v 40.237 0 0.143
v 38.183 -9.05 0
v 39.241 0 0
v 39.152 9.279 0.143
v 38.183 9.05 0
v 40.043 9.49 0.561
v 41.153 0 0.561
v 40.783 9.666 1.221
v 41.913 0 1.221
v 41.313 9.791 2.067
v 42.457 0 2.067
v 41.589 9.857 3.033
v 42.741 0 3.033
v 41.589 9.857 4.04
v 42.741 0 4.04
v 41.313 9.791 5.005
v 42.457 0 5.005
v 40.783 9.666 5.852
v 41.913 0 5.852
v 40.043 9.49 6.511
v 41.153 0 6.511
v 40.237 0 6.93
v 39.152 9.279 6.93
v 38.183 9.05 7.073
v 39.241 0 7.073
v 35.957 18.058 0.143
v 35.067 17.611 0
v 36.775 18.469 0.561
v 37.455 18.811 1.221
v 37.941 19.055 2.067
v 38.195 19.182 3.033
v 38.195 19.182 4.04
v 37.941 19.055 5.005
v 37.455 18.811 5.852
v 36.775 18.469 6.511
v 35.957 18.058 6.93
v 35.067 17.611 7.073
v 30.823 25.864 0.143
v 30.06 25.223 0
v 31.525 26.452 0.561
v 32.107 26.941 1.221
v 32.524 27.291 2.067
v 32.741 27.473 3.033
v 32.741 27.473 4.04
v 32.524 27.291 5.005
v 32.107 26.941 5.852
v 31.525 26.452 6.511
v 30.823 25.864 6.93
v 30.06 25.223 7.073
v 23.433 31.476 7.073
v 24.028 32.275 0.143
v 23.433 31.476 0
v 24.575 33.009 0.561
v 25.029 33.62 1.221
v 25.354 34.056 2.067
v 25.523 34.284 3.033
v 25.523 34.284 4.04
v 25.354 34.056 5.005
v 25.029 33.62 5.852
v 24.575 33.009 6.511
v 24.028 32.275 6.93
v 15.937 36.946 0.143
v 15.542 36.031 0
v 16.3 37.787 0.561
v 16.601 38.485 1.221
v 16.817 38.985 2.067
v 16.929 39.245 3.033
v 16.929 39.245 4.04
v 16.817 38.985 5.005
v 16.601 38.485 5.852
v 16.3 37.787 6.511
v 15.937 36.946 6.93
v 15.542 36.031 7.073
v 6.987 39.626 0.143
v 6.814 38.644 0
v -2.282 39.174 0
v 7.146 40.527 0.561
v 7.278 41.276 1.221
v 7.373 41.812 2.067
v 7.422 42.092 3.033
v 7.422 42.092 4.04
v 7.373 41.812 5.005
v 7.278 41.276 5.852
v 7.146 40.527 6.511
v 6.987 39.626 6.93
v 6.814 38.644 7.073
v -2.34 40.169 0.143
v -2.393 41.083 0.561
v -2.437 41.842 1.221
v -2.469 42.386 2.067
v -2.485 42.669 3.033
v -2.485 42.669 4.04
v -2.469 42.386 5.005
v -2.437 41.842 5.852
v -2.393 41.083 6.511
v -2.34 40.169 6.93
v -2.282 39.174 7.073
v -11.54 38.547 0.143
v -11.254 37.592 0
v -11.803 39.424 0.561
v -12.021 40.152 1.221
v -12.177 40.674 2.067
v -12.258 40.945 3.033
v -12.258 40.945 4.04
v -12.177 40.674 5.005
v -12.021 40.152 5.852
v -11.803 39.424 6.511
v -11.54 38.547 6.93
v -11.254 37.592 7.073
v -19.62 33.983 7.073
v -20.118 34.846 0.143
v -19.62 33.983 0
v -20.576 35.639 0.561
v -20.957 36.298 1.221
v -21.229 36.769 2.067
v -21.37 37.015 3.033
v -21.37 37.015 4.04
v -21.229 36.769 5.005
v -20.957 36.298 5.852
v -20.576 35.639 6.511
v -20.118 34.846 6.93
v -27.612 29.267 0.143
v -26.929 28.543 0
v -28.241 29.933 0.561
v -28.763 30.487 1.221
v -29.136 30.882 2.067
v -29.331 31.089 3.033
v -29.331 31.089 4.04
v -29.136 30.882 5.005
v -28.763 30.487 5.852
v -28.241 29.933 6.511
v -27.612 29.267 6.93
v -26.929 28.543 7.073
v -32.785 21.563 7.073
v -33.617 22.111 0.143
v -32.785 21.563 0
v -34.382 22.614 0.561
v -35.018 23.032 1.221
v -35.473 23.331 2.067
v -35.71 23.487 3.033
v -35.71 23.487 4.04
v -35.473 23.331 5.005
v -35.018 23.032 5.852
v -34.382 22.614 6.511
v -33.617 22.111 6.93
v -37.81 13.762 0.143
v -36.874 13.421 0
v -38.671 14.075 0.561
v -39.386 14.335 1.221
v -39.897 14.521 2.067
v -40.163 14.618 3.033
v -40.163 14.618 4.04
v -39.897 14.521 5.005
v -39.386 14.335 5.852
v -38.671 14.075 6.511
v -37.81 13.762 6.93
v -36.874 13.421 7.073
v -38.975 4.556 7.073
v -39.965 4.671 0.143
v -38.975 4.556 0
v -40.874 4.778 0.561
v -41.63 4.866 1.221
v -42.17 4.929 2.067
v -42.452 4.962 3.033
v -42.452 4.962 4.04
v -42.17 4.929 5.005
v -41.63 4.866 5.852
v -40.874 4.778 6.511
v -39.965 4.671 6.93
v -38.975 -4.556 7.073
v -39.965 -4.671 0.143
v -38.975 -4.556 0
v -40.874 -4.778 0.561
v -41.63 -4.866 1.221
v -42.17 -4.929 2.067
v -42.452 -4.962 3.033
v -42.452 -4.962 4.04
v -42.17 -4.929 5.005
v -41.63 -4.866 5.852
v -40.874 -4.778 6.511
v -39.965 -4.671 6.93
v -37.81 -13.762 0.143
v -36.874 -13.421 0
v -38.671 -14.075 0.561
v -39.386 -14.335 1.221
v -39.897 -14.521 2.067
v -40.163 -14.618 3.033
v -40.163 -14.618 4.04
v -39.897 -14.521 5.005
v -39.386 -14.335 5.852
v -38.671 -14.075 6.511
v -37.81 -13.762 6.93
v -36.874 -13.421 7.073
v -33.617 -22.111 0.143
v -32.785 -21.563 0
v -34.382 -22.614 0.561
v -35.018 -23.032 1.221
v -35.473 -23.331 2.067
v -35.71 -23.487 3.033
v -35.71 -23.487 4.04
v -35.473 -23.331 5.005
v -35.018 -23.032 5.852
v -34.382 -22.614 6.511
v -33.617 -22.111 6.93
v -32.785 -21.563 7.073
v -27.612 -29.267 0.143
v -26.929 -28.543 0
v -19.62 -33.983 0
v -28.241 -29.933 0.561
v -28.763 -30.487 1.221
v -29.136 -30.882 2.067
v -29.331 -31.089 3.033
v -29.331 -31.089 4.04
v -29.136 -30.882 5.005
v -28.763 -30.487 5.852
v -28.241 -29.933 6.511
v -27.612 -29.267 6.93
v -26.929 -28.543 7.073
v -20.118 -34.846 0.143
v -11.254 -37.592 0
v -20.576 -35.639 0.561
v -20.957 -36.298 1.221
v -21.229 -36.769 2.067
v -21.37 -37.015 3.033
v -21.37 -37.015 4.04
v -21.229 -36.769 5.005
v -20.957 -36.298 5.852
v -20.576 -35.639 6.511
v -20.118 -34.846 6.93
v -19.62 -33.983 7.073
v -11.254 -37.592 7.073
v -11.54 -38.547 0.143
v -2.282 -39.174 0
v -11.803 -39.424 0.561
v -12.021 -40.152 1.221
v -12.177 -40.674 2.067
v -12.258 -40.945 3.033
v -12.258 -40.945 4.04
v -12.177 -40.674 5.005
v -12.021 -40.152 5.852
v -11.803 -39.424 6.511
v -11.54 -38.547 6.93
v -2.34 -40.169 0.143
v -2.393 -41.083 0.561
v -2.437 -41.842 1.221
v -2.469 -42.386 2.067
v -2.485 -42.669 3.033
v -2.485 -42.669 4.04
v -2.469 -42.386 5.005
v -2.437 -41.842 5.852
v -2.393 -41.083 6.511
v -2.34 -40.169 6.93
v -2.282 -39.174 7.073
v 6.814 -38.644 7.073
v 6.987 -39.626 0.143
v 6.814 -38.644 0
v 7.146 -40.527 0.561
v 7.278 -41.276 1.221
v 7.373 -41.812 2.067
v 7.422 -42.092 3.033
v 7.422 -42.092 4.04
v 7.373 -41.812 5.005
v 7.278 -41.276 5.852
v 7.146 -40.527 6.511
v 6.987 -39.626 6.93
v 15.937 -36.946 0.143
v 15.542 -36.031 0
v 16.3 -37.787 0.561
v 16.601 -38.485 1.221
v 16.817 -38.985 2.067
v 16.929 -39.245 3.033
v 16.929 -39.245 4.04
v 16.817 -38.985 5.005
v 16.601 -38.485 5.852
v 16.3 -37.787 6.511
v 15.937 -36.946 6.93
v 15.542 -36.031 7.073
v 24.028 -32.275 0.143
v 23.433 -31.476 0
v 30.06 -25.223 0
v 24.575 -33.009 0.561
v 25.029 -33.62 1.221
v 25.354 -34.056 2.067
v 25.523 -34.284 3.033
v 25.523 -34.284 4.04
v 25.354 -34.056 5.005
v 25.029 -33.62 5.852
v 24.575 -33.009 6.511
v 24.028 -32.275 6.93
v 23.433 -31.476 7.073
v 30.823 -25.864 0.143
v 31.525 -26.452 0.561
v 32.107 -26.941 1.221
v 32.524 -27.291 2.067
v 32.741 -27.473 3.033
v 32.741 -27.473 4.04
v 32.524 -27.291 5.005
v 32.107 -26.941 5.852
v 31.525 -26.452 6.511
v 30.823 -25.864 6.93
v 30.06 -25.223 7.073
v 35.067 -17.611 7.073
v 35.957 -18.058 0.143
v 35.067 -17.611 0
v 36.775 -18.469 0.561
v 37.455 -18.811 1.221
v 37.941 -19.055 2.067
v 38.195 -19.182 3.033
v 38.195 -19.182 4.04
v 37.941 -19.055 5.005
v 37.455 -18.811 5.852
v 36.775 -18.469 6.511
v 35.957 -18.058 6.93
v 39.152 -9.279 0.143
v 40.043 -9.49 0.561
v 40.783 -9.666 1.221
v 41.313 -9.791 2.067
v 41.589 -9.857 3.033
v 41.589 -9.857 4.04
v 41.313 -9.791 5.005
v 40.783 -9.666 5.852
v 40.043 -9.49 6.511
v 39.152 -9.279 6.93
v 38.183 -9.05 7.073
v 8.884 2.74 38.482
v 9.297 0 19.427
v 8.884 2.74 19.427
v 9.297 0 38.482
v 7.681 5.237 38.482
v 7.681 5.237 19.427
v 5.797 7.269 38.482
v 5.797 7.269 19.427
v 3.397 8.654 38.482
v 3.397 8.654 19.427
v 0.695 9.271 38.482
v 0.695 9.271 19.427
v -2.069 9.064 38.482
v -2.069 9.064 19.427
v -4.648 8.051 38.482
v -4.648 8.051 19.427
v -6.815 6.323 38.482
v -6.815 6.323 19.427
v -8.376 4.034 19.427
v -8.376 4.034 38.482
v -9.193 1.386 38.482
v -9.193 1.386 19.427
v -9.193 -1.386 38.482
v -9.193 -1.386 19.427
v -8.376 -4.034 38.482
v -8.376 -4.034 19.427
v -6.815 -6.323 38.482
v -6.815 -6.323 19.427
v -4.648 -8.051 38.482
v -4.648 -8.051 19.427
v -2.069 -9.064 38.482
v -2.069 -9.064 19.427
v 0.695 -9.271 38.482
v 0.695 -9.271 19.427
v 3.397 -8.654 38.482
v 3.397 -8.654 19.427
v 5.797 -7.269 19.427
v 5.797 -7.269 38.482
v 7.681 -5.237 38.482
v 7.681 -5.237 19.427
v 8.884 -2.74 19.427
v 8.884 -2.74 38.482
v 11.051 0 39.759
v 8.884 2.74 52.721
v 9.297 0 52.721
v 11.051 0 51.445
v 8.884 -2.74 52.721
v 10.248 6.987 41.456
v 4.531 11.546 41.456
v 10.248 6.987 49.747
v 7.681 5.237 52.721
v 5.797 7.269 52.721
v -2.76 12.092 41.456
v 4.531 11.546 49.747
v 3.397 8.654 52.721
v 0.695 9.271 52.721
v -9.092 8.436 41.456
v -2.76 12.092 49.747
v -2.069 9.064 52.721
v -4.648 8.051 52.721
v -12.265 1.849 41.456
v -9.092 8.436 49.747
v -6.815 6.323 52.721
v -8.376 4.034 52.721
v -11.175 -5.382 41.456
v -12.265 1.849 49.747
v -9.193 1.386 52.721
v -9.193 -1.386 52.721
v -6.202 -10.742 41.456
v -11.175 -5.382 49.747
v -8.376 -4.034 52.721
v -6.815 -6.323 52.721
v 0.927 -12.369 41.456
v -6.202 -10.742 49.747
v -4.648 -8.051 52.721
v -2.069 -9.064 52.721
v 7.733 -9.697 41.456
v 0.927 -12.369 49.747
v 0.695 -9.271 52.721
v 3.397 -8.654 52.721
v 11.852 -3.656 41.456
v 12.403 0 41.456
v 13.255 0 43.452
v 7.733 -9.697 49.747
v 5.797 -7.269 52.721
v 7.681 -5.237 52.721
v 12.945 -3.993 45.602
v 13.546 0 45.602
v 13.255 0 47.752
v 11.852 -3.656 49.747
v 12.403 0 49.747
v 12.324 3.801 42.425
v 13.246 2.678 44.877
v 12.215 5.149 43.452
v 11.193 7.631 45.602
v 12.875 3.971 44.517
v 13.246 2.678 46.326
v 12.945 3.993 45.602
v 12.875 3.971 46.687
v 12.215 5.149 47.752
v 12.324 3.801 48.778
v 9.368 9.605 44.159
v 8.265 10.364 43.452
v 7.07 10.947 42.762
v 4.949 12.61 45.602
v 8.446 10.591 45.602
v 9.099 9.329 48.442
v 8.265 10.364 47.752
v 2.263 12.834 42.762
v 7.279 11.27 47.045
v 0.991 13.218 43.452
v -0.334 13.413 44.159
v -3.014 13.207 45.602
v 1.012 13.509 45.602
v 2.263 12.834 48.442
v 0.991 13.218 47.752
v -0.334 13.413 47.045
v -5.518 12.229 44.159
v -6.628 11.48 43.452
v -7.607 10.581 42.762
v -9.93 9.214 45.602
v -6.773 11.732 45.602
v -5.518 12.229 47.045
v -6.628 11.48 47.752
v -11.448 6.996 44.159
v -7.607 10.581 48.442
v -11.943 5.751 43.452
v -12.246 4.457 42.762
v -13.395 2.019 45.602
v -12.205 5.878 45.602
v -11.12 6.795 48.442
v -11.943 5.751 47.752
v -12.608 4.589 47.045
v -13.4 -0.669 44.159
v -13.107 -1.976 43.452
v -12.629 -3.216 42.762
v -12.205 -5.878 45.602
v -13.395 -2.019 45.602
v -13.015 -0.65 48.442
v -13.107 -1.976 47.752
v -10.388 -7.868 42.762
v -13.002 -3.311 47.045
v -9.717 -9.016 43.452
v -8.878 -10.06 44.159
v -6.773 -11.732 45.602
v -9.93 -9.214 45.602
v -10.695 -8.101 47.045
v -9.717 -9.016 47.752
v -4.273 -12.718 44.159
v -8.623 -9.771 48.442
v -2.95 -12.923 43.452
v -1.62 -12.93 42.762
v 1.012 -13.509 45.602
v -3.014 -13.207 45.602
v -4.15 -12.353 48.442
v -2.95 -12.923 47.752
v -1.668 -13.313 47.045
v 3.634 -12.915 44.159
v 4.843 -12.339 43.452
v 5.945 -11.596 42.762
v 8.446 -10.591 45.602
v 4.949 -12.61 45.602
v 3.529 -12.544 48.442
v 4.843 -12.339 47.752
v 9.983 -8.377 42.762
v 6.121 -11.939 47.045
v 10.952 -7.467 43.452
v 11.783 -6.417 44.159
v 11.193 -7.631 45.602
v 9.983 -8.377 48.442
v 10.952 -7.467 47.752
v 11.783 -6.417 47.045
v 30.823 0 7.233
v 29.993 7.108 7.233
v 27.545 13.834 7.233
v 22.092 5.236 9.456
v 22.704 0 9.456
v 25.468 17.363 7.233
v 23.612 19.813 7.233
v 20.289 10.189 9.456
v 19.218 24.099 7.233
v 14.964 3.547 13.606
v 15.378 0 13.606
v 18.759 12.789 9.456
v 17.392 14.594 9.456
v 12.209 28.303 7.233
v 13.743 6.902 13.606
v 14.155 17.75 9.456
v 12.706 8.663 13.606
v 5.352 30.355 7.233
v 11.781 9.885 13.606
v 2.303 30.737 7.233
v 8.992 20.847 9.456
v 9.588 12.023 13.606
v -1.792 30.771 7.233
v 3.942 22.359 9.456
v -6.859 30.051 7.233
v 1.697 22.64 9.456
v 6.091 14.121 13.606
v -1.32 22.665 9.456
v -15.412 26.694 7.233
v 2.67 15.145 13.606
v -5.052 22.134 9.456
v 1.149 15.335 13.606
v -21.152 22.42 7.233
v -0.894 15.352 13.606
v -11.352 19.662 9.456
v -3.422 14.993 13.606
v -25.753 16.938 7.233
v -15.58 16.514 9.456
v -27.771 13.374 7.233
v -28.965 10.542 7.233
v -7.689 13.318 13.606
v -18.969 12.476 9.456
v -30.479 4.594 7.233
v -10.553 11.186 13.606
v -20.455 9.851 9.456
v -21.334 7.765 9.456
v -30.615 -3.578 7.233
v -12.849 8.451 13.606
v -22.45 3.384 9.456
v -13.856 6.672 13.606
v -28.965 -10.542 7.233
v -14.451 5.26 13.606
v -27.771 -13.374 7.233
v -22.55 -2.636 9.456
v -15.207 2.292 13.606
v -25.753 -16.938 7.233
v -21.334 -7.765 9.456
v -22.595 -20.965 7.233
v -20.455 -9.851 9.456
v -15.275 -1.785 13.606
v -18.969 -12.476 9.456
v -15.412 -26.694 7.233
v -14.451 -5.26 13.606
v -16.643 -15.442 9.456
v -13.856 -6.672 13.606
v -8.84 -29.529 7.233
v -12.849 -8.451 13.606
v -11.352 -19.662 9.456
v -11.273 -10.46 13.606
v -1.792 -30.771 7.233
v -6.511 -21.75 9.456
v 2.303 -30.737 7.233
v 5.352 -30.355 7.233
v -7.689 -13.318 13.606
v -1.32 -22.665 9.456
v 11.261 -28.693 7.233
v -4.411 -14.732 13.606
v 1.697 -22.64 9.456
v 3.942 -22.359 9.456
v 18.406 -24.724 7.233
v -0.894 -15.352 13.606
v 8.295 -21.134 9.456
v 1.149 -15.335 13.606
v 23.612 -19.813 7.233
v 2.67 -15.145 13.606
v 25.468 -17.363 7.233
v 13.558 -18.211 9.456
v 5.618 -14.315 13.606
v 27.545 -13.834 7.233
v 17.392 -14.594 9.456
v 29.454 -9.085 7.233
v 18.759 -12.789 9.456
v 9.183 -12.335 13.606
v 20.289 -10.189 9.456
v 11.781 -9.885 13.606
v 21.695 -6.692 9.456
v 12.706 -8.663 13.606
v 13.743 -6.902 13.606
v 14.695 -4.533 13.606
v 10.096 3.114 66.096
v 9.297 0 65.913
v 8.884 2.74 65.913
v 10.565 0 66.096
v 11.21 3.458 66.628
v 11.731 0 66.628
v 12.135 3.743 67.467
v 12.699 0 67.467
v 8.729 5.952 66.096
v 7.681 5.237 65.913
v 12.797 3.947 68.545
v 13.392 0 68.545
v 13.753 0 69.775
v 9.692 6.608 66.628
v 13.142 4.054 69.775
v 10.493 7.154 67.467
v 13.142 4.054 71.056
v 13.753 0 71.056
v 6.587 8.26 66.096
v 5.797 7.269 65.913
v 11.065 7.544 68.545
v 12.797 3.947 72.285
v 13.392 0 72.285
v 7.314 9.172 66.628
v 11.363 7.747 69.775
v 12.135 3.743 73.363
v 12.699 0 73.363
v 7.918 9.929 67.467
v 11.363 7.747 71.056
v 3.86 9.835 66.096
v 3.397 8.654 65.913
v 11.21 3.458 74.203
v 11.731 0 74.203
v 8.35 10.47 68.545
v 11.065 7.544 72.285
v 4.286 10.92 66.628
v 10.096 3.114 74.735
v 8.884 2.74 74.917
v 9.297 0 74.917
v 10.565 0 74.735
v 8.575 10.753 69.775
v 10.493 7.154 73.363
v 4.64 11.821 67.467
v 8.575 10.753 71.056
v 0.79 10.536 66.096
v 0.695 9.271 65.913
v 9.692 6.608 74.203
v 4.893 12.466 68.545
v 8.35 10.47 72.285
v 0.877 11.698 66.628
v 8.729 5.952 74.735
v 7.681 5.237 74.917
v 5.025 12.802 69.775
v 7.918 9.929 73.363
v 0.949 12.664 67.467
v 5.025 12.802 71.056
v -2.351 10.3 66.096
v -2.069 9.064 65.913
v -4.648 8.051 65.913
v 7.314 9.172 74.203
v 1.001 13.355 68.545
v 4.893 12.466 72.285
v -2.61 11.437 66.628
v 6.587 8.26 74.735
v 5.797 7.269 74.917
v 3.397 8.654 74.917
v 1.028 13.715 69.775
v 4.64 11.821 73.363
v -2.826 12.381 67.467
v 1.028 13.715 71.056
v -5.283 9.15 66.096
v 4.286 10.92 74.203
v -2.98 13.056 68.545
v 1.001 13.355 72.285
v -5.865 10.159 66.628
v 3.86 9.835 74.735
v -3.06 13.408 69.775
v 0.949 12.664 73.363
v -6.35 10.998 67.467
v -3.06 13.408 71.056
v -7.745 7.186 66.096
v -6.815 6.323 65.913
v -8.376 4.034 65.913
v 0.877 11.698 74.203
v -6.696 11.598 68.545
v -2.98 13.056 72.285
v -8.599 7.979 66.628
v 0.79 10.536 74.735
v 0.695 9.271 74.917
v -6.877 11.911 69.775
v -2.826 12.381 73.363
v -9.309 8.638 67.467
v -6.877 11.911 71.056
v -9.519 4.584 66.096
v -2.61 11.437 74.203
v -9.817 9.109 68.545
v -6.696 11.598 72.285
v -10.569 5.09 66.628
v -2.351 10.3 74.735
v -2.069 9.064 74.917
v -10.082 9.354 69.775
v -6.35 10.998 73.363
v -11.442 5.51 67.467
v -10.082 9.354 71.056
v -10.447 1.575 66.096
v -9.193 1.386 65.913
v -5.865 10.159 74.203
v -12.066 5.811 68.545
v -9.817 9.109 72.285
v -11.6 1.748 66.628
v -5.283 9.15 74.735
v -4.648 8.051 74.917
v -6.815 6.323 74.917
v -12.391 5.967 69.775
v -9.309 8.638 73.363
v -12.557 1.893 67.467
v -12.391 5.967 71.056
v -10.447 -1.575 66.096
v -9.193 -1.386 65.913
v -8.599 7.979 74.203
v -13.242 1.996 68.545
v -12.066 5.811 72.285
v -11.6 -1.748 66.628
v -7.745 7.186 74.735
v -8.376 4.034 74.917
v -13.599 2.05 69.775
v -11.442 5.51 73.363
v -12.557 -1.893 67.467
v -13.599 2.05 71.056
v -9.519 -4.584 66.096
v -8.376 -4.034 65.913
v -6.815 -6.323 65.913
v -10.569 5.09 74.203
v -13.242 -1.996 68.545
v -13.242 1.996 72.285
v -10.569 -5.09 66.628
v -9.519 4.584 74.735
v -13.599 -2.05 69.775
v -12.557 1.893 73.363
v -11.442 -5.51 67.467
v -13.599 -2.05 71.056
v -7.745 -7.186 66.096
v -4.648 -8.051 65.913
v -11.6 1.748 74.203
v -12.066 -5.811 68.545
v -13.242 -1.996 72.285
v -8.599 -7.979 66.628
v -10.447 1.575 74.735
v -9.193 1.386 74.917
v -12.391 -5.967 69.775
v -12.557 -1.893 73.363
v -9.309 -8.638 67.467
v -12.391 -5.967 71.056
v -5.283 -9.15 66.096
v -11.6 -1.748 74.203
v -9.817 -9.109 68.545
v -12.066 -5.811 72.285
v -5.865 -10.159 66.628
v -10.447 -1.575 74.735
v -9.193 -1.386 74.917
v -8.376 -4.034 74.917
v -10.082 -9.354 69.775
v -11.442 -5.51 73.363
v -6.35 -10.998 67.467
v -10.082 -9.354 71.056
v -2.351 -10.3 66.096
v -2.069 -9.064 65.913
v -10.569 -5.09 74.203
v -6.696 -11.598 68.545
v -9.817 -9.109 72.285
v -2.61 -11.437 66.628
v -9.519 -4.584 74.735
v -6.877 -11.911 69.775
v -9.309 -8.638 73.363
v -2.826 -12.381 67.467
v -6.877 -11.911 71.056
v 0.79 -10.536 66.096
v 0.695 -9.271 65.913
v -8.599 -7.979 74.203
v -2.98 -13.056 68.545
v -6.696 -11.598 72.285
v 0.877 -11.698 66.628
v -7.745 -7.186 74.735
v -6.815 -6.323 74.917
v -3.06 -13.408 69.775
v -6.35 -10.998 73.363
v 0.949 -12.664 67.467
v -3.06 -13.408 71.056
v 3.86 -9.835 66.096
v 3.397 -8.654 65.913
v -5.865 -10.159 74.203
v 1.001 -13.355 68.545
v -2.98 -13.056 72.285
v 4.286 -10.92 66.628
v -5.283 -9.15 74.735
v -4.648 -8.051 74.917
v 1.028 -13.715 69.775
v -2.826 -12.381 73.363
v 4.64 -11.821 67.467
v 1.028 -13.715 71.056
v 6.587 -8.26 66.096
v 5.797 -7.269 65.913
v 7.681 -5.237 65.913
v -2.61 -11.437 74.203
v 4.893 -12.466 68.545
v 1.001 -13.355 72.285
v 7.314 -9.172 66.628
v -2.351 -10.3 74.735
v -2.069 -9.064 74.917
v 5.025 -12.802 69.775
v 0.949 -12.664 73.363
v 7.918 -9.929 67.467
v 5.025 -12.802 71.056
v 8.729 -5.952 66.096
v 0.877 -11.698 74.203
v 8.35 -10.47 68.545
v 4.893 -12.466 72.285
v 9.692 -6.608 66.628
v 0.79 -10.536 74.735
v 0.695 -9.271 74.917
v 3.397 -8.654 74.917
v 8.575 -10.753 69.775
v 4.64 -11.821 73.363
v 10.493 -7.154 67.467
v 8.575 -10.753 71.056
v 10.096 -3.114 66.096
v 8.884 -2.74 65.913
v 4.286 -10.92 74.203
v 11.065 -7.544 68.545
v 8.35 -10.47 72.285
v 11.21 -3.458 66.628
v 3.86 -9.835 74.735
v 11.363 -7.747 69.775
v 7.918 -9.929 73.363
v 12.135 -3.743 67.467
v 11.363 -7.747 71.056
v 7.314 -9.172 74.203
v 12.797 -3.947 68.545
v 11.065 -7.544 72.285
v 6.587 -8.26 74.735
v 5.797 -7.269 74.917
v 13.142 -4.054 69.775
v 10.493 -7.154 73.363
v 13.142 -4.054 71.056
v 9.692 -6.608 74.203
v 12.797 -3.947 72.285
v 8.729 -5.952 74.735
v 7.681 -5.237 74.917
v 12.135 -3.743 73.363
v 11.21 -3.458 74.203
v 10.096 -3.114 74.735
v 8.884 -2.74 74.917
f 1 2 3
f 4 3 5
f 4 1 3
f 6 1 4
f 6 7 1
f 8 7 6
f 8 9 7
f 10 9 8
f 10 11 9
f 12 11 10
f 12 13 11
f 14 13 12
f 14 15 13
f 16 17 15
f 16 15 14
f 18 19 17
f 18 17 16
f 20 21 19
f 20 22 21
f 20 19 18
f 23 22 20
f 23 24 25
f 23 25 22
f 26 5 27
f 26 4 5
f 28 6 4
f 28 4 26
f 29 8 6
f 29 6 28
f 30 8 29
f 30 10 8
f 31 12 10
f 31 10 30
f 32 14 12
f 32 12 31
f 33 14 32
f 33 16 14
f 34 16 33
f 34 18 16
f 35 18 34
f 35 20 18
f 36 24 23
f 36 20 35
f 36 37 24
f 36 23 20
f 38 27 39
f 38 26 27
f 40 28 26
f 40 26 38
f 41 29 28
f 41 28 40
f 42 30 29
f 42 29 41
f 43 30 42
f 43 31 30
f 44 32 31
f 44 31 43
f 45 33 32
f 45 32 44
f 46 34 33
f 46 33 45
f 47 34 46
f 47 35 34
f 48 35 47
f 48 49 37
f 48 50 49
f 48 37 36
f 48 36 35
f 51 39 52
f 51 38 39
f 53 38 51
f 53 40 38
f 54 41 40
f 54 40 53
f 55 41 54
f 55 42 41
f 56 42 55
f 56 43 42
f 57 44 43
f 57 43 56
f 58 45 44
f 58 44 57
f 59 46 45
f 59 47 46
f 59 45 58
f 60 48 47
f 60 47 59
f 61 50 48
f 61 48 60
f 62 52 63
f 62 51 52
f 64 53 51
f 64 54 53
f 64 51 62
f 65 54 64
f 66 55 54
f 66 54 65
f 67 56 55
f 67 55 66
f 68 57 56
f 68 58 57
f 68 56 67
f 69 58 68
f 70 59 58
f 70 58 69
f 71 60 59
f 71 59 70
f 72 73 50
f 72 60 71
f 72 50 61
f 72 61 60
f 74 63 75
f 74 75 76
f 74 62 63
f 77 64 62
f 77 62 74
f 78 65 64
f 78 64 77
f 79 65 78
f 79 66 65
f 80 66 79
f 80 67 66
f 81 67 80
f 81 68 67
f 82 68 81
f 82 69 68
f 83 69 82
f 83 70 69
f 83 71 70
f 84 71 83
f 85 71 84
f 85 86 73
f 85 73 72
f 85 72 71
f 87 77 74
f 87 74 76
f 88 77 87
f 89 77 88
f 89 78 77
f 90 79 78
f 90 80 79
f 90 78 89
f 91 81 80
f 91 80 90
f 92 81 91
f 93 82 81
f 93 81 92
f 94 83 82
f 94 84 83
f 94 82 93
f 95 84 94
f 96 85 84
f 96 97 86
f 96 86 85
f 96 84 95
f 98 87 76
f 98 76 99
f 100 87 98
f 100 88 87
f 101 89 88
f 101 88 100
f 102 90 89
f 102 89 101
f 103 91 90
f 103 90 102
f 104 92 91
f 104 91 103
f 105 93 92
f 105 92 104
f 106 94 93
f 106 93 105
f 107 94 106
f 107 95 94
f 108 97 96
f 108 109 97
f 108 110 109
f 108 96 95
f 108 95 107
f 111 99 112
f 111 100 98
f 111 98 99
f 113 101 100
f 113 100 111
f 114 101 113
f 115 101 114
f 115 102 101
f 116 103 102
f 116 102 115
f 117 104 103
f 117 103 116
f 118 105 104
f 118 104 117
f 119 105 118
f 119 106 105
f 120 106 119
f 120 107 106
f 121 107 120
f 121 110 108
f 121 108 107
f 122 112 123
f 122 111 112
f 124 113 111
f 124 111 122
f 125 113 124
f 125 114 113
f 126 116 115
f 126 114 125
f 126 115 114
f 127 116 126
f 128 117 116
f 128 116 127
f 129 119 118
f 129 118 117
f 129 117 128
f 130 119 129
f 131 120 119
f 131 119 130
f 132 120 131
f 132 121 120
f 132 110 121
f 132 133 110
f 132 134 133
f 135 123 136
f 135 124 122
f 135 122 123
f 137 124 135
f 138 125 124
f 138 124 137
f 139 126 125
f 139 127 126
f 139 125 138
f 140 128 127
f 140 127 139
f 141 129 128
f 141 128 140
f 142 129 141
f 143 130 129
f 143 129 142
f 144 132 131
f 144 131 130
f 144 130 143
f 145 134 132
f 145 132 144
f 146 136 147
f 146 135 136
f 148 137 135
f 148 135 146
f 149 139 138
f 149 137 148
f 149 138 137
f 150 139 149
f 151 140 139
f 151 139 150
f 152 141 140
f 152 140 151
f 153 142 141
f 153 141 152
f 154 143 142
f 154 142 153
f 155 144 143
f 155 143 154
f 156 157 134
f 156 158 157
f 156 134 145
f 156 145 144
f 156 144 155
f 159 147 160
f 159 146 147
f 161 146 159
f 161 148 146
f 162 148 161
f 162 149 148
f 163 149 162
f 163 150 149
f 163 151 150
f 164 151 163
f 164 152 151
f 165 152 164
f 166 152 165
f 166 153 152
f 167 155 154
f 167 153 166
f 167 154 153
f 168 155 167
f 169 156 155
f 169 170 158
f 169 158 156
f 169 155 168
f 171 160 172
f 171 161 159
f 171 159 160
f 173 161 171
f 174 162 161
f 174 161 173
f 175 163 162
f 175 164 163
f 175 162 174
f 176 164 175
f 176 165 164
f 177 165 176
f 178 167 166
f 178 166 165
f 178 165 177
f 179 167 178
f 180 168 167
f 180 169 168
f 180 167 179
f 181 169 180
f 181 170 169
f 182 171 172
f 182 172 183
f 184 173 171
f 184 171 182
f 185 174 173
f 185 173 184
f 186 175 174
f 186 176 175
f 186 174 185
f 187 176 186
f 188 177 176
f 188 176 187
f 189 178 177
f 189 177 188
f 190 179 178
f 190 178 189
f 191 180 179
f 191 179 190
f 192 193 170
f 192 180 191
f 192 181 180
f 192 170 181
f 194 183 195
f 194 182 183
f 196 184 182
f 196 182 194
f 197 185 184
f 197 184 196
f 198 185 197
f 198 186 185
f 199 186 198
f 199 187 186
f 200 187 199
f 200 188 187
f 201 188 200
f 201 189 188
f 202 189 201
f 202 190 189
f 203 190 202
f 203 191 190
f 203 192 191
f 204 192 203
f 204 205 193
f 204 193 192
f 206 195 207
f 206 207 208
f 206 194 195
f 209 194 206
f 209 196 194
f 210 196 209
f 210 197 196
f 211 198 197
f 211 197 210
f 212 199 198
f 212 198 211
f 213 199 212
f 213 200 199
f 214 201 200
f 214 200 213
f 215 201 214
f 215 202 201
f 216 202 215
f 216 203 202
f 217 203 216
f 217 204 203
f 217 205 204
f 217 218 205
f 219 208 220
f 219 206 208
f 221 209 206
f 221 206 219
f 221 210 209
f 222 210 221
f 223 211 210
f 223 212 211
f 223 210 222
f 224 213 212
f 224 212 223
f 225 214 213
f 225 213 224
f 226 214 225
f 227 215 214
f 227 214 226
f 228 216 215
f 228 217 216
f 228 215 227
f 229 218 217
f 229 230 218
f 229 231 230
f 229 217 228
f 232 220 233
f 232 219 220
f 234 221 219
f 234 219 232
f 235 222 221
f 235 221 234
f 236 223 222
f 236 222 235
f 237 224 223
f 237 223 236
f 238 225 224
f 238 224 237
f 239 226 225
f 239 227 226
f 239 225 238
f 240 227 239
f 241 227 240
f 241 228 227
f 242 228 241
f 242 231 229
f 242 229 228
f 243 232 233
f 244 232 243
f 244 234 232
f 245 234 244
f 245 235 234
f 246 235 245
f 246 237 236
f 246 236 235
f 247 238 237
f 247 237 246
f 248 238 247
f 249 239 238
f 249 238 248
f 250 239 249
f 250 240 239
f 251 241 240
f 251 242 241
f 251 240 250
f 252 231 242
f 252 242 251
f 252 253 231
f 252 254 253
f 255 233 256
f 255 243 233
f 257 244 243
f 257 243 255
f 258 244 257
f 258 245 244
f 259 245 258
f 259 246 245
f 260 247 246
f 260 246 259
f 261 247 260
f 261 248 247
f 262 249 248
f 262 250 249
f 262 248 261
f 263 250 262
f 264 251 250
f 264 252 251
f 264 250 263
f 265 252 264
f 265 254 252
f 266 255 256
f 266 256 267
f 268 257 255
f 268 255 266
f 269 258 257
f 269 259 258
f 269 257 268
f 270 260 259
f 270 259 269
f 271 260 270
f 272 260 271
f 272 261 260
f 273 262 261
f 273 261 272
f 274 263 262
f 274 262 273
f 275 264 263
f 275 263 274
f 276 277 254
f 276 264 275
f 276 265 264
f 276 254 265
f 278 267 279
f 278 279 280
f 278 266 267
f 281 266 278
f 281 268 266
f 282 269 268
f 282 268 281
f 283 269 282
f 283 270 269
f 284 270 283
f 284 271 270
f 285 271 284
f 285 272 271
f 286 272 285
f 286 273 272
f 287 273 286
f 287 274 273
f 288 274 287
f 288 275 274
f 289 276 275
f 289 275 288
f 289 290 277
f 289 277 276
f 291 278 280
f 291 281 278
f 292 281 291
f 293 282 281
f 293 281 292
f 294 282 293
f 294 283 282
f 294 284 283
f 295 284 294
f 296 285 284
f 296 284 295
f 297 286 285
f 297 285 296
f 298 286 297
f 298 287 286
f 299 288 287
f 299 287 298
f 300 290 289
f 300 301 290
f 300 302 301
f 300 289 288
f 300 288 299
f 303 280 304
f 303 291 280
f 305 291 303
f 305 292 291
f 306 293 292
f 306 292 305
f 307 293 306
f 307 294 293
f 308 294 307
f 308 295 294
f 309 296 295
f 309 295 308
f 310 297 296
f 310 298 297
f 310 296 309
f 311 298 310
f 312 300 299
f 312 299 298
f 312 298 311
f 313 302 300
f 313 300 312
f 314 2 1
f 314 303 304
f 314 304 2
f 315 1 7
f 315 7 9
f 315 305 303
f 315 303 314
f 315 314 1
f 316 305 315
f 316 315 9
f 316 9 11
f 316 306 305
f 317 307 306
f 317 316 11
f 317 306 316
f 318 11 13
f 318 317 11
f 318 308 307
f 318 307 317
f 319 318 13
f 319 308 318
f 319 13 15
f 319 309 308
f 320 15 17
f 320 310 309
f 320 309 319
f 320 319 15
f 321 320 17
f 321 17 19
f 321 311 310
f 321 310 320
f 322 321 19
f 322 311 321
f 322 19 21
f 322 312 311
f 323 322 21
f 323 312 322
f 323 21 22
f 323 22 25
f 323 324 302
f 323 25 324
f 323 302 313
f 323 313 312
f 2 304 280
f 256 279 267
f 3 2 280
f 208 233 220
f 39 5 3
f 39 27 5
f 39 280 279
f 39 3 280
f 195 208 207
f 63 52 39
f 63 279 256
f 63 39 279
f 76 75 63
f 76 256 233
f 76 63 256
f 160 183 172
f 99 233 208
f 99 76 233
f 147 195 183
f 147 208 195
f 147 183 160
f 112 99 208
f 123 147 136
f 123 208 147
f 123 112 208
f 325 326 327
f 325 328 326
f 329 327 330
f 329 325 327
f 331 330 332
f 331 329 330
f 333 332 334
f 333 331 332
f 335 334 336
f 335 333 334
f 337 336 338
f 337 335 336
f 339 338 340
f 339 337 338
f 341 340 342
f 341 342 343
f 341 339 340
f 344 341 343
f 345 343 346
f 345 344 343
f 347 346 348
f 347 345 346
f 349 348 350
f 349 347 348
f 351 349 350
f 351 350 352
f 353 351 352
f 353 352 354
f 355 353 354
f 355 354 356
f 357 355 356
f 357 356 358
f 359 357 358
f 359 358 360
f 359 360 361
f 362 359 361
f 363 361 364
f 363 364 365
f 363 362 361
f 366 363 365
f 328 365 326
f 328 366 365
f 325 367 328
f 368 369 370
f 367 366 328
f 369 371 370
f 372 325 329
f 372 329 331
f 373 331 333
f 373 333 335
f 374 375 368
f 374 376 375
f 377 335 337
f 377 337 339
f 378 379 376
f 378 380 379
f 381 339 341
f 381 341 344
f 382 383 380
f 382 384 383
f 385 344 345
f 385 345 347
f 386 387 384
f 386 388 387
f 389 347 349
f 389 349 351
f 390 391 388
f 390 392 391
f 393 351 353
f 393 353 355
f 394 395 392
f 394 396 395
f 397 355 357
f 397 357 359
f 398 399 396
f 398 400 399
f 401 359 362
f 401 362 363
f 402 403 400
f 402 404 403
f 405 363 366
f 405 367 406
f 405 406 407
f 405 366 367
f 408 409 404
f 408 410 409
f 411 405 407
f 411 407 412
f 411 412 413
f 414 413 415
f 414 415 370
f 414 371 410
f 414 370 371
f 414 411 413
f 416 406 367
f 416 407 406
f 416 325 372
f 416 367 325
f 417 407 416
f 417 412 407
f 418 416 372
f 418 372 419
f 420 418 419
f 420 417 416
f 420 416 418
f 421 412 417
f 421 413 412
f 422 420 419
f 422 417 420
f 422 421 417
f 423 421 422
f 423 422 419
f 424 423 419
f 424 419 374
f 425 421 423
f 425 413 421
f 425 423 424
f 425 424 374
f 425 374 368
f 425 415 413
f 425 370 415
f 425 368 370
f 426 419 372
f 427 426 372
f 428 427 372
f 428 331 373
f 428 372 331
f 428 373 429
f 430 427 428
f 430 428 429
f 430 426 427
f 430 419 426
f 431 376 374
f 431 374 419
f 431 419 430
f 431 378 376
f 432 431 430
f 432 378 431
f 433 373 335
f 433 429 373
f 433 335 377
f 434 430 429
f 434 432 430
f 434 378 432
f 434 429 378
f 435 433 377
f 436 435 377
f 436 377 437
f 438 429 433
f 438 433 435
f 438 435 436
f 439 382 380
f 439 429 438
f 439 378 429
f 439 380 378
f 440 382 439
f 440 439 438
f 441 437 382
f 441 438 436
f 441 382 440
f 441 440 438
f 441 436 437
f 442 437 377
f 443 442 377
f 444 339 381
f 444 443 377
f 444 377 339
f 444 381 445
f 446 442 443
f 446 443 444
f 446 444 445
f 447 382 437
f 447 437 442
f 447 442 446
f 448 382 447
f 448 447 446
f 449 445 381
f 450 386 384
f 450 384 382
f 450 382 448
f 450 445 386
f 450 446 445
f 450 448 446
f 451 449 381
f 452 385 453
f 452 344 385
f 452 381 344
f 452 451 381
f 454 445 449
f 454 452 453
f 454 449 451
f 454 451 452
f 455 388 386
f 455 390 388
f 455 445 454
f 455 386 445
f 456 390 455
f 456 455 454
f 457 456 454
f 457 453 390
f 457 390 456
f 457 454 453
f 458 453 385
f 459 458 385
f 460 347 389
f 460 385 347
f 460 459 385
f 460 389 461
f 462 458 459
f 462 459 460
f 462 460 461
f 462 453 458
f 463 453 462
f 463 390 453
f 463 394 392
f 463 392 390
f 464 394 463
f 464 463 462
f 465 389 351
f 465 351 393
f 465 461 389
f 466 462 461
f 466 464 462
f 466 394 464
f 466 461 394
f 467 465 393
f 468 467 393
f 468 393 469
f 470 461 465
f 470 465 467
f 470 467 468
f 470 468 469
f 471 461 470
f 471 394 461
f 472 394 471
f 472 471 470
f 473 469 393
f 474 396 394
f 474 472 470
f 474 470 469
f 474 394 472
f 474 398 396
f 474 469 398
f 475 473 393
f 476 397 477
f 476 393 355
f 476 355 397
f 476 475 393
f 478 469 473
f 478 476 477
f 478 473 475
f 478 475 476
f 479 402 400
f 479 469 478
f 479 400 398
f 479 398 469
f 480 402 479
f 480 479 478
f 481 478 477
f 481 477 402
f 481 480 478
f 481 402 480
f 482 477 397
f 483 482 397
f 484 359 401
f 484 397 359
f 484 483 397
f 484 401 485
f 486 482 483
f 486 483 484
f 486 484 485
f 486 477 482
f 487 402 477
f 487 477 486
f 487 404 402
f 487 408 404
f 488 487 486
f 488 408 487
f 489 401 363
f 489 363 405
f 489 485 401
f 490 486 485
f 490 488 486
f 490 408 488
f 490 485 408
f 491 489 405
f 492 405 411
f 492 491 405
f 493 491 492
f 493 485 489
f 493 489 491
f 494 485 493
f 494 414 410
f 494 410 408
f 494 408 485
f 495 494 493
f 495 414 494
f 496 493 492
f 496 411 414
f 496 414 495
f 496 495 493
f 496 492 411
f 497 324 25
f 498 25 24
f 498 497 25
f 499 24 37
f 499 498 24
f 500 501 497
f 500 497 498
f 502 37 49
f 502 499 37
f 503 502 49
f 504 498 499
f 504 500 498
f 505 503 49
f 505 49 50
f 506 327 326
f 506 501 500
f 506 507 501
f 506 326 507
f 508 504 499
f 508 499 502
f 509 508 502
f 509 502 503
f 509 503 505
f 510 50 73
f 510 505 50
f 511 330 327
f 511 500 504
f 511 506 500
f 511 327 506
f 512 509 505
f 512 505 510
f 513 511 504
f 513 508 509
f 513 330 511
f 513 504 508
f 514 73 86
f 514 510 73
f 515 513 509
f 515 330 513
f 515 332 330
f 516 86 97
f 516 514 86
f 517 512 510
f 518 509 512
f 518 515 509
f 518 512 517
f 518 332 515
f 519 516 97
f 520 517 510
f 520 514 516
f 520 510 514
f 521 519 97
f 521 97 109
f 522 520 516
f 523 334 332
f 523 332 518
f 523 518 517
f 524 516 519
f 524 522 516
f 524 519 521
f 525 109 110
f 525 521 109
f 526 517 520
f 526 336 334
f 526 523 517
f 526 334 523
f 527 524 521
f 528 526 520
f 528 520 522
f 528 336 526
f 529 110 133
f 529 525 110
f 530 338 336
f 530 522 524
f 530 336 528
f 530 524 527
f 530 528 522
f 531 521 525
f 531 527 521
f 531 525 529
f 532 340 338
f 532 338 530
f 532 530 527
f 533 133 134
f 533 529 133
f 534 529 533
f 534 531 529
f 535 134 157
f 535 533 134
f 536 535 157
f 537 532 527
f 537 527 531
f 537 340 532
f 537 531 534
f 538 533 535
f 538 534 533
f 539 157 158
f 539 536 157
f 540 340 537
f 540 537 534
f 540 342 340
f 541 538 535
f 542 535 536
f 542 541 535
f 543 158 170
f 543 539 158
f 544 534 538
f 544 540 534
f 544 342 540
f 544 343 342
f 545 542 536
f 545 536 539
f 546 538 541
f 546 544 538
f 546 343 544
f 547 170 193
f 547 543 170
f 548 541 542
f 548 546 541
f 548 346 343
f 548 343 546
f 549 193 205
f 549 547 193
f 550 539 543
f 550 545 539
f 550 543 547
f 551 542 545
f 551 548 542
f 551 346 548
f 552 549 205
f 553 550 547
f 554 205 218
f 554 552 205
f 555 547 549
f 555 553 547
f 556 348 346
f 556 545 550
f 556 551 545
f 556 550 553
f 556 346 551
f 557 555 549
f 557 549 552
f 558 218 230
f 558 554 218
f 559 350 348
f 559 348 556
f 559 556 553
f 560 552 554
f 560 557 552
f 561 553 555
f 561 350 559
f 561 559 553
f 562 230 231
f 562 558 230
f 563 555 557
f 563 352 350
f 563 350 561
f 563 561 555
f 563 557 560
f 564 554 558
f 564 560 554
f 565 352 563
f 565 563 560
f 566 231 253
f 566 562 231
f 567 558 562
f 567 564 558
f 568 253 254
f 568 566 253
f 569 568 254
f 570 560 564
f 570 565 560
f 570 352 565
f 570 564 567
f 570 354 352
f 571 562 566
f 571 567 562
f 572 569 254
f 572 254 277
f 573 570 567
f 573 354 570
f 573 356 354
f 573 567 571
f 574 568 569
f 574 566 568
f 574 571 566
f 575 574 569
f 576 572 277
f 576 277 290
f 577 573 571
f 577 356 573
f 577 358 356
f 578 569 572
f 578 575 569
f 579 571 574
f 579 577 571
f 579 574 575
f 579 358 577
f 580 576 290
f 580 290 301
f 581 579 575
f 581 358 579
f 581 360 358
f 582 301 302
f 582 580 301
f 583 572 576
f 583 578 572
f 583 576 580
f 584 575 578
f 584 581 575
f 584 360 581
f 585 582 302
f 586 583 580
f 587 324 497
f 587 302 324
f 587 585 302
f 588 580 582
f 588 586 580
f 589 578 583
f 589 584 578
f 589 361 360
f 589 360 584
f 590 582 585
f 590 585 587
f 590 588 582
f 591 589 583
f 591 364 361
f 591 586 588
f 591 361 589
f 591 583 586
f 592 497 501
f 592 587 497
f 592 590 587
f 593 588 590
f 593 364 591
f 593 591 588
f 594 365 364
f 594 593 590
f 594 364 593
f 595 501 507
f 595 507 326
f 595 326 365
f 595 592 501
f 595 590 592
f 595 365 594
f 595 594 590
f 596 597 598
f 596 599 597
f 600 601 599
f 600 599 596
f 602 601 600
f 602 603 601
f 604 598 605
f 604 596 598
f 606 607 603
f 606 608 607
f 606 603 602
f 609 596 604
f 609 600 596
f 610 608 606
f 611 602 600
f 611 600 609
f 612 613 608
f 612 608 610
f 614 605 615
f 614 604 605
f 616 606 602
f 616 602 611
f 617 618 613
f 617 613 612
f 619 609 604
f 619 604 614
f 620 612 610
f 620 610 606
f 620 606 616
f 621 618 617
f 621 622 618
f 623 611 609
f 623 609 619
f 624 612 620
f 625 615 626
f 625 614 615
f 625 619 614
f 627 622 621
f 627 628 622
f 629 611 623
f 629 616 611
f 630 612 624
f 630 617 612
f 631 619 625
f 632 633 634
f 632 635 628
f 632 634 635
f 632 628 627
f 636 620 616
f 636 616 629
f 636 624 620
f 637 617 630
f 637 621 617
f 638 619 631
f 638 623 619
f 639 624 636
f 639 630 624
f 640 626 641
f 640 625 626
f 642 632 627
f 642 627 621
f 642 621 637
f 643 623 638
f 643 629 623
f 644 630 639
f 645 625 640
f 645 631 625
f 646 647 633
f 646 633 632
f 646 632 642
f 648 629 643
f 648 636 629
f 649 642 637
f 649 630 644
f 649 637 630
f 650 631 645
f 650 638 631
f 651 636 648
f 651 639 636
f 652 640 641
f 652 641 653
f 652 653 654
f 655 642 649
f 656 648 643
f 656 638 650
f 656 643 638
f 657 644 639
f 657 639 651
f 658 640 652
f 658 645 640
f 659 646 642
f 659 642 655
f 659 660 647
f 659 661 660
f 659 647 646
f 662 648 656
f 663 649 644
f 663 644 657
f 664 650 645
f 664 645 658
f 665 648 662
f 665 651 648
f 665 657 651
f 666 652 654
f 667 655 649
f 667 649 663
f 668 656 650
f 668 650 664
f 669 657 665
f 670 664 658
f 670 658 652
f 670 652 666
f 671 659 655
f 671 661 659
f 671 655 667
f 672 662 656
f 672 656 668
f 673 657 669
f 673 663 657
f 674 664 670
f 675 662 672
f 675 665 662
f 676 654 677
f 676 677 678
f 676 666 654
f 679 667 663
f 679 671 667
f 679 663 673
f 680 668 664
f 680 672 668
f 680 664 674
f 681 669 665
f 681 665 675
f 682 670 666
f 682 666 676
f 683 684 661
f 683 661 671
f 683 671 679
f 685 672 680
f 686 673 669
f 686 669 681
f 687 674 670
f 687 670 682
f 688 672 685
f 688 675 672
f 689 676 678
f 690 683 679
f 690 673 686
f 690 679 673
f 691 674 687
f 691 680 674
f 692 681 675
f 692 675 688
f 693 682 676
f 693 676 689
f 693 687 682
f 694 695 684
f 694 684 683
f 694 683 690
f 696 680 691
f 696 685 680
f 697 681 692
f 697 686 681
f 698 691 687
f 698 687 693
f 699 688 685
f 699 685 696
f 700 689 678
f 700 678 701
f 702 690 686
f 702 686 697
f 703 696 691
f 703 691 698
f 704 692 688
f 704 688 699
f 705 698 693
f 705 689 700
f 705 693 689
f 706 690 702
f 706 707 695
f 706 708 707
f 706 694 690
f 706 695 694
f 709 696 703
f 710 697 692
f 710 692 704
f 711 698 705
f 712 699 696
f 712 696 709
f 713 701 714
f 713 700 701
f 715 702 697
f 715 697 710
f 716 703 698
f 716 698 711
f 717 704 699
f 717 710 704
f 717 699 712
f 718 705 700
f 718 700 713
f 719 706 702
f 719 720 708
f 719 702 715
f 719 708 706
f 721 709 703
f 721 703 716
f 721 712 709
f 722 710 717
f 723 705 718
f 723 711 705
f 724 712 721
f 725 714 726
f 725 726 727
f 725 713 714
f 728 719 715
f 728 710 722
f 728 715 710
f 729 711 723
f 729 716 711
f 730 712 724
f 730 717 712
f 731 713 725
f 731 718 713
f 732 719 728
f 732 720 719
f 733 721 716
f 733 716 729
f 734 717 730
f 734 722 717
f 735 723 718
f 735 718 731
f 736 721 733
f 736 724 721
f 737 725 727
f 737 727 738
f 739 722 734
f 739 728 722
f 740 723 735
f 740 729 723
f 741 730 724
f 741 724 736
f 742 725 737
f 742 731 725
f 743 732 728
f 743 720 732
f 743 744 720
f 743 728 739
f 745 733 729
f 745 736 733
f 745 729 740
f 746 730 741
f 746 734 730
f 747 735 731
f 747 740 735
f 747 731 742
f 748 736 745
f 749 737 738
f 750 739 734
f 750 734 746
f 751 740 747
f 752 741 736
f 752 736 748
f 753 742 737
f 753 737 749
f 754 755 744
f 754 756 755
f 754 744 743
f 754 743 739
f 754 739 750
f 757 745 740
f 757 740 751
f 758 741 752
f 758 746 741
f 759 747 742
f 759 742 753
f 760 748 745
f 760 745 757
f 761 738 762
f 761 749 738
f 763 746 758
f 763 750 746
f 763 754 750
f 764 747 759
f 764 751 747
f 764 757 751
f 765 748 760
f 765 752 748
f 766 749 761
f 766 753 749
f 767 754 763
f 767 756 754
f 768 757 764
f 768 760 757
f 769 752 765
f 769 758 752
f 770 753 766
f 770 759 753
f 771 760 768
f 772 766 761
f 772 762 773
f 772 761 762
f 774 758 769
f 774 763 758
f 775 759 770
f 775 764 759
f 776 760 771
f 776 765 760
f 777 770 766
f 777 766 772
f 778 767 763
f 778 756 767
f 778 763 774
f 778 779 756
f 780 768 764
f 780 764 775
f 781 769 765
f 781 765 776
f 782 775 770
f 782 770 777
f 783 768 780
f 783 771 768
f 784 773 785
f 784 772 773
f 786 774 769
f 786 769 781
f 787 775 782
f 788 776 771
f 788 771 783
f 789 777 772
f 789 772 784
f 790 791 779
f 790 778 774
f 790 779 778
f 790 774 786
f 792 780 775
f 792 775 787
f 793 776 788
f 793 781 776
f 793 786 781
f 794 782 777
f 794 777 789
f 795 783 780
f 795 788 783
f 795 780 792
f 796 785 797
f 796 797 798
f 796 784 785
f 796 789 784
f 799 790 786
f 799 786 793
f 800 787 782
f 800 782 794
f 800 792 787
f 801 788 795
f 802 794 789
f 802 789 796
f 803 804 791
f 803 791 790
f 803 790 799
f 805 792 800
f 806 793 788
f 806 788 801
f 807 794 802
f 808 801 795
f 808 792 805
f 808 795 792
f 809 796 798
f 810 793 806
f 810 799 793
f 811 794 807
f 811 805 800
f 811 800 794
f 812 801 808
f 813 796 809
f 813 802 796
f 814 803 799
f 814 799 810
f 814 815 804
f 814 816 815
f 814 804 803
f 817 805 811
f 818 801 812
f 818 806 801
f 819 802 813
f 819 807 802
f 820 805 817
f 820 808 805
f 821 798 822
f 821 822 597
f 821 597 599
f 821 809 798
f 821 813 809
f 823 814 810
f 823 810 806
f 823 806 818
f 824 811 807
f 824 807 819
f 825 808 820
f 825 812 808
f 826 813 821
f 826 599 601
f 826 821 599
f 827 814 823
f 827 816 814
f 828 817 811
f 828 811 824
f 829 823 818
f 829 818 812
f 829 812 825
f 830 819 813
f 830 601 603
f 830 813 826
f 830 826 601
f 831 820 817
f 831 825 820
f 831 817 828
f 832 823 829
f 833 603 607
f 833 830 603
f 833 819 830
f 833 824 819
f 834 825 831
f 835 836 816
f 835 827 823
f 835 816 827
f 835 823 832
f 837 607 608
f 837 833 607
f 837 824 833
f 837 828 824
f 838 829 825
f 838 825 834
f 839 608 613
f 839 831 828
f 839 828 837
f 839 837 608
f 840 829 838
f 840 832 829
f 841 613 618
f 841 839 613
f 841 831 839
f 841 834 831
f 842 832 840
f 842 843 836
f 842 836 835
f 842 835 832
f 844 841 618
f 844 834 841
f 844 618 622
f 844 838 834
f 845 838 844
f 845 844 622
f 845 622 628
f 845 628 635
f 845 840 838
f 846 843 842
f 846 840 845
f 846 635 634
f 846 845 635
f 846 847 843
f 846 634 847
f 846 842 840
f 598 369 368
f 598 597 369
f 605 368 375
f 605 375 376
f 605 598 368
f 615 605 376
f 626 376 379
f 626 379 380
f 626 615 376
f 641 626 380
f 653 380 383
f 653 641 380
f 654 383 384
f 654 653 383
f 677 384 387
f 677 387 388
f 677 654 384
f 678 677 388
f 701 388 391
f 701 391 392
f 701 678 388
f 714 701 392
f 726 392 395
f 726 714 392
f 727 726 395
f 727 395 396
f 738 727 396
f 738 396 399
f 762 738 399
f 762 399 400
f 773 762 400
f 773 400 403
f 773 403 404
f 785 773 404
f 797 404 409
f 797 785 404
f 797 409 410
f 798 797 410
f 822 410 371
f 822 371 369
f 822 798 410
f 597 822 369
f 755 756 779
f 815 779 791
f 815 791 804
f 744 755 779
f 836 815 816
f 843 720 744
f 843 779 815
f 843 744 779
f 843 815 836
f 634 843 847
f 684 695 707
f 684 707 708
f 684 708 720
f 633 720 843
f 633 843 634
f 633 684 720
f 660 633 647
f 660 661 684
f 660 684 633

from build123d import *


with BuildPart() as f1:
    # F0 (on Front) → F1 (revolve)
    with BuildSketch(Plane.XZ):
        with BuildLine():
            Line((0, 74.917264), (0, 0))
            Line((0, 0), (39.240602, 0))
            ThreePointArc((39.240602, 0), (42.776984, 3.536382), (39.240602, 7.072763))
            ThreePointArc((39.240602, 7.072763), (22.703598, 9.45647), (9.296888, 19.427162))
            Line((9.296888, 19.427162), (9.296888, 38.482253))
            ThreePointArc((9.296888, 38.482253), (13.546492, 45.601735), (9.296888, 52.721217))
            Line((9.296888, 52.721217), (9.296888, 65.913208))
            ThreePointArc((9.296888, 65.913208), (13.798916, 70.415236), (9.296888, 74.917264))
            Line((9.296888, 74.917264), (0, 74.917264))
        make_face()
    revolve(axis=Axis((0, 0, 37.458632), (0, 0, 1)))


solid = f1.part
